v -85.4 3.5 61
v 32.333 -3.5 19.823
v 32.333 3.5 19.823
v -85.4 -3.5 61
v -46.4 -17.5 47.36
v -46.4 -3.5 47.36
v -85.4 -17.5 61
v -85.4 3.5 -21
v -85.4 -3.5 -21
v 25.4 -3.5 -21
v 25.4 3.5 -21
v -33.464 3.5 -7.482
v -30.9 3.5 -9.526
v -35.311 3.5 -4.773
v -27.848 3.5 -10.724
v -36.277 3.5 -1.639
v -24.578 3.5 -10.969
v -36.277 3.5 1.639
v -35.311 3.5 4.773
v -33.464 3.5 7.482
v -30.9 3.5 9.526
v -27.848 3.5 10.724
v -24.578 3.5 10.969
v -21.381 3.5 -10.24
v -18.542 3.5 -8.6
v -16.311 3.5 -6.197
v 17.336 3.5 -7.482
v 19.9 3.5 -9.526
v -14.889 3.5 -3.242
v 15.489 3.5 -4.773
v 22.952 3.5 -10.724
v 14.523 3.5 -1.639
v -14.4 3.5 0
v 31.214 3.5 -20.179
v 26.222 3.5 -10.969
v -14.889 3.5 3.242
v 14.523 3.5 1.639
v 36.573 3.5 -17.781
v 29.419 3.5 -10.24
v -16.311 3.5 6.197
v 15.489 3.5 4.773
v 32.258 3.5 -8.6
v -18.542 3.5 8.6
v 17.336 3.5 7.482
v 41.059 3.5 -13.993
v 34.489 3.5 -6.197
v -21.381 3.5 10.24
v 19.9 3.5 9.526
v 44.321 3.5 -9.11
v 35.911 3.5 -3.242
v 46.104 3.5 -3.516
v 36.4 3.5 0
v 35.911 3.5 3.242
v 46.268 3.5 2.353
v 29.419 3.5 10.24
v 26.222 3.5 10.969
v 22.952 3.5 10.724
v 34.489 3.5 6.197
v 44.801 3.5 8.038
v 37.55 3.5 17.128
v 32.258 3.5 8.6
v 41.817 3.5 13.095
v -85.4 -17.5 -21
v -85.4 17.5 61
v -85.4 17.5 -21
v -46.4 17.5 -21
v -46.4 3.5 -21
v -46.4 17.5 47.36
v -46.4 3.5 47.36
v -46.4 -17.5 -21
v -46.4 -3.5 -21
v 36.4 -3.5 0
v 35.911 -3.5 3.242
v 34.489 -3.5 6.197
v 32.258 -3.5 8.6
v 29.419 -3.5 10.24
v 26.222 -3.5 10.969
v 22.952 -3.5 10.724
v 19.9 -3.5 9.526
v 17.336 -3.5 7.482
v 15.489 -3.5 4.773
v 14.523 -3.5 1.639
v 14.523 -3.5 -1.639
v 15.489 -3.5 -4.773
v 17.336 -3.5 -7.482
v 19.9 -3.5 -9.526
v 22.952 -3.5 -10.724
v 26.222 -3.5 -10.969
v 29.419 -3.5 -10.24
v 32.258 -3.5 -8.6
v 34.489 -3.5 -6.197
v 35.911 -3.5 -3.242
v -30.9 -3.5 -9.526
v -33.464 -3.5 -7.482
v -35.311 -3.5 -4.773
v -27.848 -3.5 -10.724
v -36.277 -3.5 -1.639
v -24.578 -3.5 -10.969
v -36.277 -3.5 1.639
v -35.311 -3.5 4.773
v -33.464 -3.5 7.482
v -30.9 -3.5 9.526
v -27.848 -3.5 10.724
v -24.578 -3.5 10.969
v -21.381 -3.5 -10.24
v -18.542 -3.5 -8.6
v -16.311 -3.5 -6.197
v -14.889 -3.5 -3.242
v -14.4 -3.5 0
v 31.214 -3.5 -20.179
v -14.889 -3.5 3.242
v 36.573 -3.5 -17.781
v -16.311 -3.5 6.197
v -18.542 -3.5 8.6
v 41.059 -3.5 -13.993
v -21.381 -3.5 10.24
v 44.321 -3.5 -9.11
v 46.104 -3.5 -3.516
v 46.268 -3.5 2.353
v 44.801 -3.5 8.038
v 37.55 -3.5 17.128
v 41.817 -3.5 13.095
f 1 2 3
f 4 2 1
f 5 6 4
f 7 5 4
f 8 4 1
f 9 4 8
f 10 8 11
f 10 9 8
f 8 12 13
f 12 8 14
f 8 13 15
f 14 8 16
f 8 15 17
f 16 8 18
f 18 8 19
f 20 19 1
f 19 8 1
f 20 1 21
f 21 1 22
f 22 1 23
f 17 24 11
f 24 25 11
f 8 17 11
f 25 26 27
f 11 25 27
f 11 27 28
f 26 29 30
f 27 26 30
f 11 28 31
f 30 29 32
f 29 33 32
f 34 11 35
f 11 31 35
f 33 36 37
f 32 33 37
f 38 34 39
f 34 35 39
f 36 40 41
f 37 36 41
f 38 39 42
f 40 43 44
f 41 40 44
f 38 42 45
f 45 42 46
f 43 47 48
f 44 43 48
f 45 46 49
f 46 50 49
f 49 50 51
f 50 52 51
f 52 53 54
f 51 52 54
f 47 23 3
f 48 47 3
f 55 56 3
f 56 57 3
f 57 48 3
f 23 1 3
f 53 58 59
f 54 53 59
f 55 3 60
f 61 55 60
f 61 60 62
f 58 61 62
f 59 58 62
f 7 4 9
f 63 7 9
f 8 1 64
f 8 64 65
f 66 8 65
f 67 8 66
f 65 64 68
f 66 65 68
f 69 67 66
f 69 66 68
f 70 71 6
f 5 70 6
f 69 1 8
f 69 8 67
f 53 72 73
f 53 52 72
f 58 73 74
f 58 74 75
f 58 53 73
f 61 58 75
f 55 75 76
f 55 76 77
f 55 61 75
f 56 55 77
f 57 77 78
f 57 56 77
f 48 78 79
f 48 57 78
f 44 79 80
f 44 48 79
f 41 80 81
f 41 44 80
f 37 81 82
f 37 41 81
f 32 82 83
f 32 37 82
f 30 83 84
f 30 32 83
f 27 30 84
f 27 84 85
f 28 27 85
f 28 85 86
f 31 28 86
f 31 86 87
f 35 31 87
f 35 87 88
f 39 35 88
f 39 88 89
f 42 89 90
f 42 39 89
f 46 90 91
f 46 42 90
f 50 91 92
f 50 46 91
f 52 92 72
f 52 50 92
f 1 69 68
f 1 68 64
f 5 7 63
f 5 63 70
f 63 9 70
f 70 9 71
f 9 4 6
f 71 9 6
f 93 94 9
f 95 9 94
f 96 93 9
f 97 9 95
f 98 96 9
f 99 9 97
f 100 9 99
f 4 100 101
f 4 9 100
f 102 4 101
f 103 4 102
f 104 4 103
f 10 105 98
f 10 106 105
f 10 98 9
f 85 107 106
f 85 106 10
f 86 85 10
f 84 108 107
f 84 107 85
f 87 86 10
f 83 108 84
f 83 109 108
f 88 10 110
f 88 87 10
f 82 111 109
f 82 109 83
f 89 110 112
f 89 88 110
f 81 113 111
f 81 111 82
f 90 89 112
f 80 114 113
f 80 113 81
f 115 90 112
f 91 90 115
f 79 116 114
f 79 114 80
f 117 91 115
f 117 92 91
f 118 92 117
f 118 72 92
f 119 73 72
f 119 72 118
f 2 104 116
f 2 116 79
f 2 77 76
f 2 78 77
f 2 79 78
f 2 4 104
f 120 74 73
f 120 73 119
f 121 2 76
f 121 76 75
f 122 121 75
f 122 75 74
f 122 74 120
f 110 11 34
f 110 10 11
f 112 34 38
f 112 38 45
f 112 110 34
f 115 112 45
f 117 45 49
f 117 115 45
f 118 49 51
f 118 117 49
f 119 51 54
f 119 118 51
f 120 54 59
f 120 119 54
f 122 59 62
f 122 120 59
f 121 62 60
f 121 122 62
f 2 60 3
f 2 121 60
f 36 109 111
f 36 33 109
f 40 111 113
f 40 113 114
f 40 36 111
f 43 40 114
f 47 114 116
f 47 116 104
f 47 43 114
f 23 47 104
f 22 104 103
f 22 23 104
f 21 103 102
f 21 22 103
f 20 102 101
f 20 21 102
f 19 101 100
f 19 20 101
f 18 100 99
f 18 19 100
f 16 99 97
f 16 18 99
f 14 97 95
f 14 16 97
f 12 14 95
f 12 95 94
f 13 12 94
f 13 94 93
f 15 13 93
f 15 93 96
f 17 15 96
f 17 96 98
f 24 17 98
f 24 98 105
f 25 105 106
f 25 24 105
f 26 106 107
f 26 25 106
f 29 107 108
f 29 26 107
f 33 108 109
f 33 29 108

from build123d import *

# Parameters (mm, degrees)
F0_R     = 11
F1_DEPTH = 3.5
F3_DEPTH = 14


with BuildPart() as f1:
    # F0 (on Front) → F1 (new body, symmetric)
    with BuildSketch(Plane.XZ):
        with BuildLine():
            ThreePointArc((32.332994, 19.822553), (28.916134, 20.703546), (25.4, 21))
            Line((25.4, 21), (-85.4, 21))
            Line((-85.4, 21), (-85.4, -21))
            Line((-85.4, -21), (25.4, -21))
            ThreePointArc((25.4, -21), (46.103546, -3.516134), (32.332994, 19.822553))
        make_face()
        with Locations((-25.4, 0)):
            Circle(F0_R, mode=Mode.SUBTRACT)
        with Locations((25.4, 0)):
            Circle(F0_R, mode=Mode.SUBTRACT)
        with BuildLine():
            Line((-85.4, 21), (25.4, 21))
            ThreePointArc((25.4, 21), (28.916134, 20.703546), (32.332994, 19.822553))
            Line((32.332994, 19.822553), (-85.4, 61))
            Line((-85.4, 61), (-85.4, 21))
        make_face()
    extrude(amount=F1_DEPTH, both=True)


with BuildPart() as f3:
    # F2 (on face) → F3 (new body)
    with BuildSketch(Plane.XZ.offset(3.5)):
        Polygon((-46.4, 47.35964), (-85.4, 61), (-85.4, -21), (-46.4, -21), align=None)
    extrude(amount=F3_DEPTH)


with BuildPart() as f4_1:
    # F4: instance of F3
    add(f3.part.mirror(Plane.XZ))


solid = Compound([f1.part, f3.part, f4_1.part])
